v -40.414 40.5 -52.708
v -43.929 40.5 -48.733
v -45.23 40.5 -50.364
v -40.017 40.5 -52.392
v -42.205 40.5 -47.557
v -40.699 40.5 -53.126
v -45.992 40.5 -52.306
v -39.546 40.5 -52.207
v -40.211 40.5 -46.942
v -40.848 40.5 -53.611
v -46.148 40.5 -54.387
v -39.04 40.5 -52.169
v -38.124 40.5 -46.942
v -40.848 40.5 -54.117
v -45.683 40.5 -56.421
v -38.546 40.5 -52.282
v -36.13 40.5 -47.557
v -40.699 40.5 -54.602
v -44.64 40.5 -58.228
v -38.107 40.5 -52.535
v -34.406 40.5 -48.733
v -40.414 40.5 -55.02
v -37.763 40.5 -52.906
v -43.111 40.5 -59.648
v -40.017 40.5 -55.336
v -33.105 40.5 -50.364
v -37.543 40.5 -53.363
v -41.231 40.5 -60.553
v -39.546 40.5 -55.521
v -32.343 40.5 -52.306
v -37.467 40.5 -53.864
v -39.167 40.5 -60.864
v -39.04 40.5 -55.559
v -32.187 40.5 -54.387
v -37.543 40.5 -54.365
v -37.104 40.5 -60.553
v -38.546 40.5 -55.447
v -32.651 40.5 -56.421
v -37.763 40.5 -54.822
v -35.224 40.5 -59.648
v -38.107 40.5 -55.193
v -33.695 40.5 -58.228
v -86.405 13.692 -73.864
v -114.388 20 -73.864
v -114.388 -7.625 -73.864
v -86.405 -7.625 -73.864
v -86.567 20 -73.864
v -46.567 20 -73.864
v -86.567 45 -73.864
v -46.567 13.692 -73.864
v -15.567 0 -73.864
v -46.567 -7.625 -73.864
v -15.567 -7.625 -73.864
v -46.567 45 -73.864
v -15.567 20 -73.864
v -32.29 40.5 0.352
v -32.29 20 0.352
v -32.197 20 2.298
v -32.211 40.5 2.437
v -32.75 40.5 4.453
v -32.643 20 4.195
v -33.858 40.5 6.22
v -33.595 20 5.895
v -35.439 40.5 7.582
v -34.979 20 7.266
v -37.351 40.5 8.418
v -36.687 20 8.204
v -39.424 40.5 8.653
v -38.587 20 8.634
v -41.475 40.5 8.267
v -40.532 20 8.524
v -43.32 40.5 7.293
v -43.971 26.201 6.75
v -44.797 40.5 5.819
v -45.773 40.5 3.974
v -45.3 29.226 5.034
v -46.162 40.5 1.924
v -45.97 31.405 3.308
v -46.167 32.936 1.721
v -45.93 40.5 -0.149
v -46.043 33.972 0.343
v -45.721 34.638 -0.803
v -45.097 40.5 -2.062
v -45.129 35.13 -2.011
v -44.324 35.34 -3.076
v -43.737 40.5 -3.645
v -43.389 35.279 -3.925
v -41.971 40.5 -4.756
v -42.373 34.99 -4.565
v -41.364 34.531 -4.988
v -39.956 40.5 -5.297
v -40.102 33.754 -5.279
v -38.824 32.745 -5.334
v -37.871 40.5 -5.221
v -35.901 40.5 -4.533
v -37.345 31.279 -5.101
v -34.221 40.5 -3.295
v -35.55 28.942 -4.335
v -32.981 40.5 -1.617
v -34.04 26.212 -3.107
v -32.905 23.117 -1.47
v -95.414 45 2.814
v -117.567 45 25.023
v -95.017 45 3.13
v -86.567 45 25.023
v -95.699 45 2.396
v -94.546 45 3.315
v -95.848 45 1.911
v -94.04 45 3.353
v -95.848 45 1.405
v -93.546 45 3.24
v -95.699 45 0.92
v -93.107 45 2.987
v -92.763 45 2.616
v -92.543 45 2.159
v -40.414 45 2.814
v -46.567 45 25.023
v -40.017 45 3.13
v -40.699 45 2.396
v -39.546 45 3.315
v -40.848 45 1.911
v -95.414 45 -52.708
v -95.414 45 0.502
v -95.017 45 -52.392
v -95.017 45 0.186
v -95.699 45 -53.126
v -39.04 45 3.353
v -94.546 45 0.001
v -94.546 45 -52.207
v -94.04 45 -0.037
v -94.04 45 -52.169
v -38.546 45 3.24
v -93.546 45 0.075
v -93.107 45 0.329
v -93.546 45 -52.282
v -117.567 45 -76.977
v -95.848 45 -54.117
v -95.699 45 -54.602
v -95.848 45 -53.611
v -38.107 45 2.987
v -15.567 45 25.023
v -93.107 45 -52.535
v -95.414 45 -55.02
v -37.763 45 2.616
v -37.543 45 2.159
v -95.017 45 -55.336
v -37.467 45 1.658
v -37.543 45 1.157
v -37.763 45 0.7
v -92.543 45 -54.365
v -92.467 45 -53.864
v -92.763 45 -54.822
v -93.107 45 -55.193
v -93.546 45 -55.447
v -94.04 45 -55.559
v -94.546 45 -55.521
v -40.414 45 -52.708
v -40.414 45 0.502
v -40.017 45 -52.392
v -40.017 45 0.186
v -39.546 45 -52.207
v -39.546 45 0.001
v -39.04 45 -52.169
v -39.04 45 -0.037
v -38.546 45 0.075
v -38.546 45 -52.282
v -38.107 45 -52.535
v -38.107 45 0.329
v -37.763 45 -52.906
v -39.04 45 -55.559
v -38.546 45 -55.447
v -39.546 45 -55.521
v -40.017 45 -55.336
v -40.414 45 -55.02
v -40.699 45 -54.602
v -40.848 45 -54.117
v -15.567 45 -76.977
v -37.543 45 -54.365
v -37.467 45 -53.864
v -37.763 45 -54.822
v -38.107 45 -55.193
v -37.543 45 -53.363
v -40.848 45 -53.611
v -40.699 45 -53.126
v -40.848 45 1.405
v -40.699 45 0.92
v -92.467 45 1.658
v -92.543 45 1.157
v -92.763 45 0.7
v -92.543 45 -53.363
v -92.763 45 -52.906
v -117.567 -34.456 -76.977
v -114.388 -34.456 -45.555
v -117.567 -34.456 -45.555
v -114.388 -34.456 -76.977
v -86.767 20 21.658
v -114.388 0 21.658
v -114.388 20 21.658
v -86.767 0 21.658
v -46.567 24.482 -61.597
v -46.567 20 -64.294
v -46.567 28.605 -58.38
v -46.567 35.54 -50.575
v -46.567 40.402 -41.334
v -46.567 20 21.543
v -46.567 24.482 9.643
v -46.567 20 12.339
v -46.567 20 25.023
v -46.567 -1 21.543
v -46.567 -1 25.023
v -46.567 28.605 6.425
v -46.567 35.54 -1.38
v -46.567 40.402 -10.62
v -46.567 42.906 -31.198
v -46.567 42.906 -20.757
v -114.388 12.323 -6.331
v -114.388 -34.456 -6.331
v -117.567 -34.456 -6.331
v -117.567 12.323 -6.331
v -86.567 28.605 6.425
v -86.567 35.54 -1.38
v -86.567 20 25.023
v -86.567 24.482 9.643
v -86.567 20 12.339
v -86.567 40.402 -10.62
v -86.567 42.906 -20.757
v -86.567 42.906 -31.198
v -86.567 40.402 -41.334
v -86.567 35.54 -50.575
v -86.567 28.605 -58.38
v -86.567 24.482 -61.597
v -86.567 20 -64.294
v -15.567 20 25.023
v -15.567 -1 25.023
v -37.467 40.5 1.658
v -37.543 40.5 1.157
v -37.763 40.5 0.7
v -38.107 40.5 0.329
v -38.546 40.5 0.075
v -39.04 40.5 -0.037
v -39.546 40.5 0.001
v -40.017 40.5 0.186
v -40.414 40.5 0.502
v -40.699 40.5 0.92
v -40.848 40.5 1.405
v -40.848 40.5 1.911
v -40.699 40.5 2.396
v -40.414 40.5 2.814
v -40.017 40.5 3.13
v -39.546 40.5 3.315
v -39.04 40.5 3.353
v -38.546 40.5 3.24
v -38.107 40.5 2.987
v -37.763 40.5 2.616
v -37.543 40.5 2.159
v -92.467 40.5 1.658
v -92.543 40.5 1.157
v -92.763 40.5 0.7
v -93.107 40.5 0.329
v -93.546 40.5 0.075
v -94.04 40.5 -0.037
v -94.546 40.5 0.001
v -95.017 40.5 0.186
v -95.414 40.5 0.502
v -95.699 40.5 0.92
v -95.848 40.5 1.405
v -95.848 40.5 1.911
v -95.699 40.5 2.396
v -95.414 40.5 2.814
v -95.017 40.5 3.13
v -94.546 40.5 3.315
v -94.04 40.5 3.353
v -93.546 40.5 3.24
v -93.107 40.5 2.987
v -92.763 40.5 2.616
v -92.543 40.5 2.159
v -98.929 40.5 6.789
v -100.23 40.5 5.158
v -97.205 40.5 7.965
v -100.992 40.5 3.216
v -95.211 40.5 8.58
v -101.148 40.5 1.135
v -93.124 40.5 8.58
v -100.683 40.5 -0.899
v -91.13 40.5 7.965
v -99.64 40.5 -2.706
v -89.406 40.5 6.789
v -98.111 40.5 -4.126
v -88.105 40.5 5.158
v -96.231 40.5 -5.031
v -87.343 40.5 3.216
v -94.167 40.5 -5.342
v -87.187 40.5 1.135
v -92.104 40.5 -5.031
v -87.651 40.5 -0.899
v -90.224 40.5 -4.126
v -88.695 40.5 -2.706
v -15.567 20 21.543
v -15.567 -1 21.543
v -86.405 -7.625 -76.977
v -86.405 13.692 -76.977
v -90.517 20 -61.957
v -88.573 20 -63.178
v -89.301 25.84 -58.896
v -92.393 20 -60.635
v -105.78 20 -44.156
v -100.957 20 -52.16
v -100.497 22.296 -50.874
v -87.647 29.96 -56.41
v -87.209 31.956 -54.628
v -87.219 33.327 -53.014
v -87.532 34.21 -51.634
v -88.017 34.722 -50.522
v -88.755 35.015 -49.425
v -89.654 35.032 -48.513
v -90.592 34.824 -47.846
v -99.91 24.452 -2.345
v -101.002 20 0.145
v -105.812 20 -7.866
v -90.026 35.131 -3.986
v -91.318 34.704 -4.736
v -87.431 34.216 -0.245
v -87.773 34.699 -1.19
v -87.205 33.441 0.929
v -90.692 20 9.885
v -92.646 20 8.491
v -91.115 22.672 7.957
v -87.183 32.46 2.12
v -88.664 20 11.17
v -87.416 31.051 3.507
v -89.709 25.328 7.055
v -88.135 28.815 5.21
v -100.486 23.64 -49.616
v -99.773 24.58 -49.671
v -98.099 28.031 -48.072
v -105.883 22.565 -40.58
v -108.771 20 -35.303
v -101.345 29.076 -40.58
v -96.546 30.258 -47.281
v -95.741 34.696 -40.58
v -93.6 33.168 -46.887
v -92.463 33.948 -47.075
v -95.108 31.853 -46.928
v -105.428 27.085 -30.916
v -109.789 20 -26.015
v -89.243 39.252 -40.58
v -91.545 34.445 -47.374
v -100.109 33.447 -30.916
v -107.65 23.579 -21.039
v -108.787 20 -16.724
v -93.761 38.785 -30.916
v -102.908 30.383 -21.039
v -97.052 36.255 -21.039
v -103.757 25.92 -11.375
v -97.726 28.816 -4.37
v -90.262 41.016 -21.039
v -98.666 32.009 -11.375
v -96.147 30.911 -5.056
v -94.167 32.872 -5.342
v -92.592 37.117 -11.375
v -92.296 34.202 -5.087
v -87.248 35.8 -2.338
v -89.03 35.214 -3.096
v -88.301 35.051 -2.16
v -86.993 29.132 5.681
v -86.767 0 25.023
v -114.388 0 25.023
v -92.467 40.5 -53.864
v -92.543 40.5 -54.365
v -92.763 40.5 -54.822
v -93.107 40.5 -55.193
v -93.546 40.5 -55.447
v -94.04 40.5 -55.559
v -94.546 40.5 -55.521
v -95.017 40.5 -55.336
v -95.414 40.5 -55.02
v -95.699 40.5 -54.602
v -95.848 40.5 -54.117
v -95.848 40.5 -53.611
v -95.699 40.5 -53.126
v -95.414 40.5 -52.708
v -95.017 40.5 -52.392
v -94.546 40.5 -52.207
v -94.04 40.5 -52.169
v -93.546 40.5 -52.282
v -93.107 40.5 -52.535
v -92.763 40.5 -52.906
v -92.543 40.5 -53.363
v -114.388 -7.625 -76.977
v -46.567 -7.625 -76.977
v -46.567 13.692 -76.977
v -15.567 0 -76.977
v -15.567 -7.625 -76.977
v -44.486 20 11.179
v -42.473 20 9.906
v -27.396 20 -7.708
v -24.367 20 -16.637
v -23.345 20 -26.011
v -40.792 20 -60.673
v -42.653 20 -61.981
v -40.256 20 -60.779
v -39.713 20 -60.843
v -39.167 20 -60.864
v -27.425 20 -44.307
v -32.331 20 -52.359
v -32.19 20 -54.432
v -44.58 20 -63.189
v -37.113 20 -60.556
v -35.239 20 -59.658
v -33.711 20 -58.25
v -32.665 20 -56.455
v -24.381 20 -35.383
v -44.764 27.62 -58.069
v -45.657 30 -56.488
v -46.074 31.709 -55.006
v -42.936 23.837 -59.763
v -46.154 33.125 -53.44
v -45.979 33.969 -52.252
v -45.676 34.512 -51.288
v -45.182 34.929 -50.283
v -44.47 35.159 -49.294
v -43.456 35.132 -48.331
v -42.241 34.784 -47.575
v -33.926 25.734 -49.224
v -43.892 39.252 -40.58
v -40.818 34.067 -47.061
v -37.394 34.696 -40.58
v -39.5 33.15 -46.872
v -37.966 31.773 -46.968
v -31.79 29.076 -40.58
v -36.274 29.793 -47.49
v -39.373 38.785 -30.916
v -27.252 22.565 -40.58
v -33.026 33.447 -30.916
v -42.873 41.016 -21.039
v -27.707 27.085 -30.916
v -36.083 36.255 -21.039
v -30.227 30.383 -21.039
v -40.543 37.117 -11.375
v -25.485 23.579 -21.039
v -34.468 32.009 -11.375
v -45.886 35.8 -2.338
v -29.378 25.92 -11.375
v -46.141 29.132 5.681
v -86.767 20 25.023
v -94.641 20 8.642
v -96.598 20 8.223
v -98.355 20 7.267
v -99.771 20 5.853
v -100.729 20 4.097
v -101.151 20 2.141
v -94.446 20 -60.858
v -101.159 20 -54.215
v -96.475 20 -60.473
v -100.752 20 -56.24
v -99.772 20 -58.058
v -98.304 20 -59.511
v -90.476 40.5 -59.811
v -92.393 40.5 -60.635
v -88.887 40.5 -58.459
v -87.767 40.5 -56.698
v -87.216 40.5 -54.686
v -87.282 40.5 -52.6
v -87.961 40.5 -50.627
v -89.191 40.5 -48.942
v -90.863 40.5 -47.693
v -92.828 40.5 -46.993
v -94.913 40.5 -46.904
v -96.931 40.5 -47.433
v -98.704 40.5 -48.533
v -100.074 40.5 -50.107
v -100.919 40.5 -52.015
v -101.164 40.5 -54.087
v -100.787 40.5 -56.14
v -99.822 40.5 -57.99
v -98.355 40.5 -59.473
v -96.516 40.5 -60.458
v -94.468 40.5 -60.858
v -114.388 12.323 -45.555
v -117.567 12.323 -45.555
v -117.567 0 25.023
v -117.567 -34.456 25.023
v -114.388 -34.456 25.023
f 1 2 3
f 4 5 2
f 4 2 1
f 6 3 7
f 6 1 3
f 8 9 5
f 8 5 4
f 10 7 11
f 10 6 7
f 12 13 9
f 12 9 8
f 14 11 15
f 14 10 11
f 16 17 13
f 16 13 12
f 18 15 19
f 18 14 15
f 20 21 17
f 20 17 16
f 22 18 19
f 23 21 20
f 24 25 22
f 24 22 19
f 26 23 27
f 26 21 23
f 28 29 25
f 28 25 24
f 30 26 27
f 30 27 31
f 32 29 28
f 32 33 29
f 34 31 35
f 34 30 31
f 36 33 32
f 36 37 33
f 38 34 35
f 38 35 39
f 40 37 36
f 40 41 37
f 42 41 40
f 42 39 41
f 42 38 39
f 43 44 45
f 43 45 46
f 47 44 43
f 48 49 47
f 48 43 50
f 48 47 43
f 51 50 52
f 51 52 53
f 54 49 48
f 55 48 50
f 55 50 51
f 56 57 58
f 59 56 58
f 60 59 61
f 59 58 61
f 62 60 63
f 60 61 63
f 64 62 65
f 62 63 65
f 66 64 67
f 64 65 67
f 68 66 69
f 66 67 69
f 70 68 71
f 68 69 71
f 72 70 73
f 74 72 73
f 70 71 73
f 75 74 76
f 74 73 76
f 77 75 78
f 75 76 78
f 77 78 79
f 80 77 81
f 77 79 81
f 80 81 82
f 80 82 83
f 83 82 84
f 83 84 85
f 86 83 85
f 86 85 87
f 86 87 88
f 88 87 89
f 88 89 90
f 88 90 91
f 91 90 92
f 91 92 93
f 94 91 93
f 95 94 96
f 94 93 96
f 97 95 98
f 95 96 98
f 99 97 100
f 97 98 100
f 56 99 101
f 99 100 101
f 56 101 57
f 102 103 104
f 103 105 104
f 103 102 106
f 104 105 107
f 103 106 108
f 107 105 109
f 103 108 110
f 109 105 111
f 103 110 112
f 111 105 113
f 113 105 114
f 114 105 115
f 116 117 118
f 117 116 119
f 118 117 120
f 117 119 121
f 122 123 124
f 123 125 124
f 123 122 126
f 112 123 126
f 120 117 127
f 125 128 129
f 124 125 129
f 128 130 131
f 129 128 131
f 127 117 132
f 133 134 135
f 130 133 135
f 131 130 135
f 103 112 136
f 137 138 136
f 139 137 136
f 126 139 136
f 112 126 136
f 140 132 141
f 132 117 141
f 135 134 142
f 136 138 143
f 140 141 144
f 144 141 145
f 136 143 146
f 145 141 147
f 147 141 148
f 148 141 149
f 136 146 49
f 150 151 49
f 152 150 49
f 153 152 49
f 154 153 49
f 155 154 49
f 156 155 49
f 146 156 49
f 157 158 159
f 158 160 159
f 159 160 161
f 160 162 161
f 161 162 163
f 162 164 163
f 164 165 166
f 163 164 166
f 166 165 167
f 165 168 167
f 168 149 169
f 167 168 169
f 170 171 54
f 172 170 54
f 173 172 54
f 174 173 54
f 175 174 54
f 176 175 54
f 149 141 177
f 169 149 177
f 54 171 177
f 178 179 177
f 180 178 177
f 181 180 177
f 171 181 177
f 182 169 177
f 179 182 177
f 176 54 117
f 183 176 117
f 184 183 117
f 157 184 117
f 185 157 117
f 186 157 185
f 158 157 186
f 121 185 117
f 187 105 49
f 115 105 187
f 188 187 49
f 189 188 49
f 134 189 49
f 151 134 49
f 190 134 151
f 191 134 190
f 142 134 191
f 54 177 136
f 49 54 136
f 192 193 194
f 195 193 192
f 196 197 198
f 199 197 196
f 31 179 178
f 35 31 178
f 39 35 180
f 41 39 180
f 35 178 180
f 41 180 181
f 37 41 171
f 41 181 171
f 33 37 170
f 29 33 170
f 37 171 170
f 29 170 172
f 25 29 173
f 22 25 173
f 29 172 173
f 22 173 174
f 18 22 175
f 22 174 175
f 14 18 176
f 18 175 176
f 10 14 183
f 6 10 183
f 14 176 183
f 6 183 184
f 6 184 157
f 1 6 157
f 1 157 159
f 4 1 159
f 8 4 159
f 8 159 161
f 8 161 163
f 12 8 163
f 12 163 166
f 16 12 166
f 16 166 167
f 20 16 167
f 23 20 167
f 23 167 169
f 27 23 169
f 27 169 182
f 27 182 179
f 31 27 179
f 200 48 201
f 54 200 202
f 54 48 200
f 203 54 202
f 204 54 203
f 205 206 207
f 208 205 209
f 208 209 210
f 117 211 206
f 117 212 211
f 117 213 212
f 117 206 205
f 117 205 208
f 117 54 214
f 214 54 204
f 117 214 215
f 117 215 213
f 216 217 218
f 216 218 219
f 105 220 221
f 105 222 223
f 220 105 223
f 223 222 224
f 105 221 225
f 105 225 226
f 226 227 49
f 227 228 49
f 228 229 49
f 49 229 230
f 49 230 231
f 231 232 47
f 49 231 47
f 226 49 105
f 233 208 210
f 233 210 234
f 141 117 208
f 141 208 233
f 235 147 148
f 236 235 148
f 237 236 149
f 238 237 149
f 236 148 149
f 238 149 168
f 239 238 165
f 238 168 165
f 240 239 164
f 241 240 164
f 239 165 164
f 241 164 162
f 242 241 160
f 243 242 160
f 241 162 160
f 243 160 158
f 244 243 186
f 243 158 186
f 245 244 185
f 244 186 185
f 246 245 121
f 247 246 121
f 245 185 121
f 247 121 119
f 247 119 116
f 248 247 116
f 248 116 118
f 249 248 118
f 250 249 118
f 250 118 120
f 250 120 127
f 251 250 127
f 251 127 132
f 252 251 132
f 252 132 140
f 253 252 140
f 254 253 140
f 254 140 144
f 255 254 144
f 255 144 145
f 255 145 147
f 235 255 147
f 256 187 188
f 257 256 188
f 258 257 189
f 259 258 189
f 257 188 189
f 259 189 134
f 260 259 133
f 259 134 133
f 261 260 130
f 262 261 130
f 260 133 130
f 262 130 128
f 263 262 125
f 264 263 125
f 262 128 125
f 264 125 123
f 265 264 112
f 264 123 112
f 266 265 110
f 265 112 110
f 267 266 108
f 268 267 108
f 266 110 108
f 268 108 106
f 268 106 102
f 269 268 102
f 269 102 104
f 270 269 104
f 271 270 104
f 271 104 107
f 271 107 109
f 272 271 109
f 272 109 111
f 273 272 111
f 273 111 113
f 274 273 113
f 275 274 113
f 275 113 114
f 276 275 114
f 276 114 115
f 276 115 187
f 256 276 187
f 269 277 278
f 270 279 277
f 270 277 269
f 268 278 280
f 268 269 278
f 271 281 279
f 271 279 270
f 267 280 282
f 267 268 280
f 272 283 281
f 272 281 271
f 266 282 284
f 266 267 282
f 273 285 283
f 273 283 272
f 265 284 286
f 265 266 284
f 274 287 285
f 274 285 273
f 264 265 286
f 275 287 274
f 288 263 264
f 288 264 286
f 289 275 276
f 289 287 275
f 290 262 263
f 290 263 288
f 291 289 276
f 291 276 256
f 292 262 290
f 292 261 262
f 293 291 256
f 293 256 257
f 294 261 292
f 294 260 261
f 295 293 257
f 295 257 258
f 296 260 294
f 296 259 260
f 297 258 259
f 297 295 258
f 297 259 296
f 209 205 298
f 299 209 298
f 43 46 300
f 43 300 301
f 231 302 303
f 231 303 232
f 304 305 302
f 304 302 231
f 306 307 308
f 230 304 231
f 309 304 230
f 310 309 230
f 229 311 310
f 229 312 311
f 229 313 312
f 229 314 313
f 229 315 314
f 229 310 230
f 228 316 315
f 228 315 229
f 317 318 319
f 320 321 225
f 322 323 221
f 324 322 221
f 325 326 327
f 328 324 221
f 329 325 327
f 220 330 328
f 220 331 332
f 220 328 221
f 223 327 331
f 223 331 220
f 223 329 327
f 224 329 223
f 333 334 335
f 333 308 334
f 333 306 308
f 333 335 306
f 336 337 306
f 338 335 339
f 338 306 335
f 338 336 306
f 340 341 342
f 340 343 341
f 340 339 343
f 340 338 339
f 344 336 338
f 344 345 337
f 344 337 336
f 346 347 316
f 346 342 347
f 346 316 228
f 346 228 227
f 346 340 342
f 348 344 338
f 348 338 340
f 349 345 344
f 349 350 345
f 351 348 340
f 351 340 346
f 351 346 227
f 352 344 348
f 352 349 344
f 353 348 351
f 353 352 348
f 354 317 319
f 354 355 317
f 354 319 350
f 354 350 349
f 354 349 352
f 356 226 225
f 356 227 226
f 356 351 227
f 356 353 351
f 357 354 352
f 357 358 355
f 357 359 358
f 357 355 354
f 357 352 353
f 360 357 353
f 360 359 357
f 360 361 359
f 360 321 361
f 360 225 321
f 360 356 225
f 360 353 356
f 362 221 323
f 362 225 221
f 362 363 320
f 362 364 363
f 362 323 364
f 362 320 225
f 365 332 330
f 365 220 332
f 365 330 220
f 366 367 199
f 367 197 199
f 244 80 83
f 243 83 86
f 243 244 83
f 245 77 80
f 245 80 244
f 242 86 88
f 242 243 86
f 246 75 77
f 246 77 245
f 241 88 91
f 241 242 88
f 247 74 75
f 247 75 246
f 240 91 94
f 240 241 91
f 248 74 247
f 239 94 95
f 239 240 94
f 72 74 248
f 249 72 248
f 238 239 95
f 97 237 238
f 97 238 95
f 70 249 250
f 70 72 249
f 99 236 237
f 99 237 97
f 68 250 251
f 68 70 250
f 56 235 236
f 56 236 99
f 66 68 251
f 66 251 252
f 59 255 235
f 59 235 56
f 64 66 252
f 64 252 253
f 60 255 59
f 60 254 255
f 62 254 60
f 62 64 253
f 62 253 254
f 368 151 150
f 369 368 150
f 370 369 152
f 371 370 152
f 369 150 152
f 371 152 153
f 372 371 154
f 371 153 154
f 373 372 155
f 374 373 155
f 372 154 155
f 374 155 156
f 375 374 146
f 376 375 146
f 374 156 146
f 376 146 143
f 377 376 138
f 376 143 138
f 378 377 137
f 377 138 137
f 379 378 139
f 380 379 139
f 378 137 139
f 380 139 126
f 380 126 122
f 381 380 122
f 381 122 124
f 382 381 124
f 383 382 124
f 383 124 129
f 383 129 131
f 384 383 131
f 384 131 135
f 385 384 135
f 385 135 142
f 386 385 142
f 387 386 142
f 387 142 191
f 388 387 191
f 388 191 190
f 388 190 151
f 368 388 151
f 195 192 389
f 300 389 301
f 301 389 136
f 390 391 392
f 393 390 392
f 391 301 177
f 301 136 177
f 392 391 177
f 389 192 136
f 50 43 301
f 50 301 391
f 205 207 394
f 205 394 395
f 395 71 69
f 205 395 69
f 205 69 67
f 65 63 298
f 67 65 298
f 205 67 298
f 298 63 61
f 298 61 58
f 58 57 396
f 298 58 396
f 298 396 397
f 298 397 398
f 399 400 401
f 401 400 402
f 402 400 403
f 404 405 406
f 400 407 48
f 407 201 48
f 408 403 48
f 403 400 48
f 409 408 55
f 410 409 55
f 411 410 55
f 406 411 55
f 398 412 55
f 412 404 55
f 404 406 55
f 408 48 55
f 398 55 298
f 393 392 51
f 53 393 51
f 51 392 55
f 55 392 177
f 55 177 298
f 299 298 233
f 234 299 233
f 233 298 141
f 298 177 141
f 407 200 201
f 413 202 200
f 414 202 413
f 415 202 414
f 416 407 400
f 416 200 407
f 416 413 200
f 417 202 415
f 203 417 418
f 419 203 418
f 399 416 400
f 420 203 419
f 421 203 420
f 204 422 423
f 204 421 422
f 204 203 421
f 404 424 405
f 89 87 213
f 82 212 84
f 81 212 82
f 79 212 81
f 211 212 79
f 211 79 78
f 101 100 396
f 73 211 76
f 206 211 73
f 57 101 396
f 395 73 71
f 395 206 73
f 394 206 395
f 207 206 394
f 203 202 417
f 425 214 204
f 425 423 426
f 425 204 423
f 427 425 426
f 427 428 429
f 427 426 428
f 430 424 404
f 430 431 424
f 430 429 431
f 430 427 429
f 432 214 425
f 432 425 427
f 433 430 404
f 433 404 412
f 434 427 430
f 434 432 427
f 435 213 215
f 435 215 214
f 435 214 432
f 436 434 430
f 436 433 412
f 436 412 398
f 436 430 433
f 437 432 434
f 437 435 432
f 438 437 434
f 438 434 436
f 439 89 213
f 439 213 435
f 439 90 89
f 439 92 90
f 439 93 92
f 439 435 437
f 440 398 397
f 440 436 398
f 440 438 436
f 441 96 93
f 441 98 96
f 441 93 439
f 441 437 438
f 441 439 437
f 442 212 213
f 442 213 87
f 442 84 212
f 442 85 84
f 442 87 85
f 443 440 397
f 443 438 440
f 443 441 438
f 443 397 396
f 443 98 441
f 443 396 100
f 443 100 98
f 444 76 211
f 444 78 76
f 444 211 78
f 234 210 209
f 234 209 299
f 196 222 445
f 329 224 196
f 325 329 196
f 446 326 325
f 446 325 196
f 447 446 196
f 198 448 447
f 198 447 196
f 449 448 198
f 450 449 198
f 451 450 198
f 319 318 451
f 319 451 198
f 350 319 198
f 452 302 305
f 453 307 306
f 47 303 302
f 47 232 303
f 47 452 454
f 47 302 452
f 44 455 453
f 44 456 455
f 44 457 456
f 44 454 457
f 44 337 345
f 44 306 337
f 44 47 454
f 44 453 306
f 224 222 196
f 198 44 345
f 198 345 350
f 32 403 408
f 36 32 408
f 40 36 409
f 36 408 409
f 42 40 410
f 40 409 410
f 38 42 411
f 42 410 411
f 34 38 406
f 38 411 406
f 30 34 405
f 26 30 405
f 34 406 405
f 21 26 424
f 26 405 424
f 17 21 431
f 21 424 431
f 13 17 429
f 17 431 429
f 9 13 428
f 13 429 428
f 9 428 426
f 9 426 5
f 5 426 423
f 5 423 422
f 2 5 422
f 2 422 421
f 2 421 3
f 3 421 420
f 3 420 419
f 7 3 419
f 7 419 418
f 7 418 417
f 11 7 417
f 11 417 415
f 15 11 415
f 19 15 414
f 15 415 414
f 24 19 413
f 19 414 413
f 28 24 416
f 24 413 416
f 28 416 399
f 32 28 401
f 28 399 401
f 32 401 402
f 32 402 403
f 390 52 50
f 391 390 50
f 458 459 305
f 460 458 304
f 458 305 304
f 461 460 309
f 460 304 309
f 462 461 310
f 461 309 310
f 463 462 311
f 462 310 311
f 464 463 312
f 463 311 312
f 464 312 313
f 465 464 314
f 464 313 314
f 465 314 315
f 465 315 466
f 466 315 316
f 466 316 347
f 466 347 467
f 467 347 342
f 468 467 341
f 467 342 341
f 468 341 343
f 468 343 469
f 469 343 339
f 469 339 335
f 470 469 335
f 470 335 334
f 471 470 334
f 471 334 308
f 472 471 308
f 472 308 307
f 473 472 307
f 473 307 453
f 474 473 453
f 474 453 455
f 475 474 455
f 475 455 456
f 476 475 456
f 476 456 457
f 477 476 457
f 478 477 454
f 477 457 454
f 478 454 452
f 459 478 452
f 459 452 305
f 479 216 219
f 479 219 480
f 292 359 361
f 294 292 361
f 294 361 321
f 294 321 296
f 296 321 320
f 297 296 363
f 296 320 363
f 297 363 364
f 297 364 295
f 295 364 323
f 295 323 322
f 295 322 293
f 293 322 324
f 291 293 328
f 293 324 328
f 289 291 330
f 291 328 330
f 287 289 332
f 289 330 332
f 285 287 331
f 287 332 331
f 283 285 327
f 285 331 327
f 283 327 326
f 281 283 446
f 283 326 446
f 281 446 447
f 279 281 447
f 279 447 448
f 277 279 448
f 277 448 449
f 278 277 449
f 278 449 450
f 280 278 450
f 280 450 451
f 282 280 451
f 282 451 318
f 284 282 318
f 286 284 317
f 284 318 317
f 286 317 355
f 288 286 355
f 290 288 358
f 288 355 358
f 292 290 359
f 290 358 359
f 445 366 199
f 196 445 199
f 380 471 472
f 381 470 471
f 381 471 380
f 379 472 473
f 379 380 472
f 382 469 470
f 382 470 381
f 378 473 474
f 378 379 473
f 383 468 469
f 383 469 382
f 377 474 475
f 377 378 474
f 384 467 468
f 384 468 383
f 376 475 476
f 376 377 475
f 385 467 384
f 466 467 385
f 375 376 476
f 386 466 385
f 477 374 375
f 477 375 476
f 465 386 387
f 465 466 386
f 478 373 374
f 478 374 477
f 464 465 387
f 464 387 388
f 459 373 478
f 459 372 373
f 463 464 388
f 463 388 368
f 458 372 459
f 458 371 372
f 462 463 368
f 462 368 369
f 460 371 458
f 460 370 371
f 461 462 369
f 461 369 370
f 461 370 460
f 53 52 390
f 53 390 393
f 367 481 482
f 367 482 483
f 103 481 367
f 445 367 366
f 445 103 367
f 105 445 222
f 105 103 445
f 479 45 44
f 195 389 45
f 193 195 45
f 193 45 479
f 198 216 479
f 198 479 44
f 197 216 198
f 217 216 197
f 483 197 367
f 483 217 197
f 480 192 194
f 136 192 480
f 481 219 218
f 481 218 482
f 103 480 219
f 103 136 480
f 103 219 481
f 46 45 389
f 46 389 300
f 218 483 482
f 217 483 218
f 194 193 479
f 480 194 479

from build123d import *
from build123d.topology import SkipClean

# Parameters (mm, degrees)
SKETCH1_W                   = 102
SKETCH1_H                   = 102
BOSS_EXTRUDE1_DEPTH         = 50
CUT_EXTRUDE_THIN1_OUTLINE_W = 40
CUT_EXTRUDE_THIN1_OUTLINE_H = 95.773670058
CUT_EXTRUDE_THIN1_DEPTH     = 50
SKETCH4_W                   = 40
SKETCH4_H                   = 6.202657501
CUT_EXTRUDE3_DEPTH          = 54
SKETCH5_W                   = 33.817621941
SKETCH5_H                   = 102.594578927
CUT_EXTRUDE4_DEPTH          = 20
SKETCH6_W                   = 27.820383201
SKETCH6_H                   = 98.886835029
CUT_EXTRUDE5_DEPTH          = 20
SKETCH7_W                   = 30.8
SKETCH7_H                   = 3.364819678
BOSS_EXTRUDE2_DEPTH         = 21
SKETCH9_W                   = 31
SKETCH9_H                   = 3.479961613
BOSS_EXTRUDE4_DEPTH         = 21
SKETCH11_W                  = 98.820383201
SKETCH11_H                  = 3.113164971
BOSS_EXTRUDE6_DEPTH         = 47.625
SKETCH14_W                  = 102
SKETCH14_H                  = 5
CUT_EXTRUDE7_DEPTH          = 105
SKETCH17_R                  = 7
CUT_EXTRUDE12_DEPTH         = 20.5
M3_CLEARANCE_HOLE1_D        = 3.4
SKETCH22_W                  = 3.179616799
SKETCH22_H                  = 102
BOSS_EXTRUDE7_DEPTH         = 47.6
SKETCH23_W                  = 98.820383201
SKETCH23_H                  = 3.113164971
CUT_EXTRUDE13_DEPTH         = 40
SKETCH24_W                  = 102
SKETCH24_H                  = 13.144479163
CUT_EXTRUDE14_DEPTH         = 10
SKETCH25_W                  = 39.837829701
SKETCH25_H                  = 21.316982849
CUT_EXTRUDE15_DEPTH         = 6
SKETCH26_W                  = 39.22350869
SKETCH26_H                  = 46.778434415
CUT_EXTRUDE16_DEPTH         = 6


# Read off the part's stored shape, not the designer's step: Cut-Extrude-Thin1
with BuildPart() as part:
    # Sketch1 → Boss-Extrude1 (new body)
    with BuildSketch(Plane(origin=(0, 0, 0), x_dir=(1, 0, 0), z_dir=(0, 1, 0))):
        with Locations((-66.567363259, 25.977216604)):
            Rectangle(SKETCH1_W, SKETCH1_H)
    extrude(amount=BOSS_EXTRUDE1_DEPTH)

    # Sketch2 → Cut-Revolve1 (revolve, cut)
    with SkipClean():  # the faces are left unmerged after this step: merging them gives an invalid solid
        with BuildSketch(Plane(origin=(0, 0, 0), x_dir=(1, 0, 0), z_dir=(0, 1, 0))):
            with BuildLine():
                ThreePointArc((-66.567363259, 73.602216604), (-114.192363259, 25.977216604), (-66.567363259, -21.647783396))
                Line((-66.567363259, -21.647783396), (-66.567363259, 73.602216604))
            make_face()
            with BuildLine():
                Line((-66.567363259, 73.602216604), (-66.567363259, -21.647783396))
                ThreePointArc((-66.567363259, -21.647783396), (-32.891402805, -7.69874385), (-18.942363259, 25.977216604))
                ThreePointArc((-18.942363259, 25.977216604), (-32.891402805, 59.653177058), (-66.567363259, 73.602216604))
            make_face()
        revolve(axis=Axis((-66.567363259, 0, 21.647783396), (0, 0, -1)), mode=Mode.SUBTRACT)
    add(part.part.scale(1), mode=Mode.REPLACE)  # the faces are merged on a copy

    # Cut-Extrude-Thin1 outline → Cut-Extrude-Thin1 (cut)
    with BuildSketch(Plane(origin=(0, 0, 0), x_dir=(1, 0, 0), z_dir=(0, 1, 0))):
        with Locations((-66.567363259, 25.977216604)):
            Rectangle(CUT_EXTRUDE_THIN1_OUTLINE_W, CUT_EXTRUDE_THIN1_OUTLINE_H)
    extrude(amount=CUT_EXTRUDE_THIN1_DEPTH, mode=Mode.SUBTRACT)

    # Sketch4 → Cut-Extrude3 (cut)
    with BuildSketch(Plane(origin=(0, 0, 0), x_dir=(1, 0, 0), z_dir=(0, 1, 0))):
        with Locations((-66.567363259, -25.010947176)):
            Rectangle(SKETCH4_W, SKETCH4_H)
    extrude(amount=CUT_EXTRUDE3_DEPTH, mode=Mode.SUBTRACT)

    # Sketch5 → Cut-Extrude4 (cut)
    with BuildSketch(Plane(origin=(0, 0, 0), x_dir=(1, 0, 0), z_dir=(0, 1, 0))):
        with Locations((-29.658552289, 22.56676217)):
            Rectangle(SKETCH5_W, SKETCH5_H)
    extrude(amount=CUT_EXTRUDE4_DEPTH, mode=Mode.SUBTRACT)

    # Sketch6 → Cut-Extrude5 (cut)
    with BuildSketch(Plane(origin=(0, 0, 0), x_dir=(-1, 0, 0), z_dir=(0, -1, 0))):
        with Locations((100.47755486, 24.420634119)):
            Rectangle(SKETCH6_W, SKETCH6_H)
    extrude(amount=-CUT_EXTRUDE5_DEPTH, mode=Mode.SUBTRACT)

    # Sketch7 → Boss-Extrude2 (add)
    with BuildSketch(Plane(origin=(0, 0, 0), x_dir=(1, 0, 0), z_dir=(0, 1, 0))):
        with Locations((-102.167363259, -23.340373557)):
            Rectangle(SKETCH7_W, SKETCH7_H)
    extrude(amount=BOSS_EXTRUDE2_DEPTH)

    # Sketch9 → Boss-Extrude4 (add)
    with BuildSketch(Plane.XZ.offset(-20)):
        with Locations((-31.067363259, 23.28280259)):
            Rectangle(SKETCH9_W, SKETCH9_H)
    extrude(amount=BOSS_EXTRUDE4_DEPTH)

    # Sketch11 → Boss-Extrude6 (add)
    with BuildSketch(Plane.XZ):
        with Locations((-64.97755486, -75.420634119)):
            Rectangle(SKETCH11_W, SKETCH11_H)
    extrude(amount=BOSS_EXTRUDE6_DEPTH)

    # Sketch14 → Cut-Extrude7 (cut)
    with BuildSketch(Plane(origin=(-15.567363259, 0, 0), x_dir=(0, 0, -1), z_dir=(1, 0, 0))):
        with Locations((25.977216604, 47.5)):
            Rectangle(SKETCH14_W, SKETCH14_H)
    extrude(amount=-CUT_EXTRUDE7_DEPTH, mode=Mode.SUBTRACT)

    # Sketch17 → Cut-Extrude12 (cut)
    with BuildSketch(Plane.XZ.offset(-20)):
        with Locations(Location((-94.167363259, 1.657963718, 0), (0, 0, 270))):
            Circle(SKETCH17_R)
        with Locations(Location((-94.167363259, -53.864051633, 0), (0, 0, 284.685382437))):
            Circle(SKETCH17_R)
        with Locations(Location((-39.167363259, 1.657963718, 0), (0, 0, 349.246729183))):
            Circle(SKETCH17_R)
        with Locations(Location((-39.167363259, -53.864051633, 0), (0, 0, 270))):
            Circle(SKETCH17_R)
    extrude(amount=-CUT_EXTRUDE12_DEPTH, mode=Mode.SUBTRACT)

    # M3 Clearance Hole1 (through all)
    with Locations(Plane(origin=(0, 40.5, 0), x_dir=(-1, 0, 0), z_dir=(0, -1, 0))):
        with Locations((94.167363259, -1.657963718), (39.167363259, -1.657963718), (39.167363259, 53.864051633), (94.167363259, 53.864051633)):
            Hole(M3_CLEARANCE_HOLE1_D / 2)

    # Sketch22 → Boss-Extrude7 (add)
    with BuildSketch(Plane.XZ):
        with Locations((-115.97755486, -25.977216604)):
            Rectangle(SKETCH22_W, SKETCH22_H)
    extrude(amount=BOSS_EXTRUDE7_DEPTH)

    # Sketch23 → Cut-Extrude13 (cut)
    with BuildSketch(Plane.XZ.offset(47.625)):
        with Locations((-64.97755486, -75.420634119)):
            Rectangle(SKETCH23_W, SKETCH23_H)
    extrude(amount=-CUT_EXTRUDE13_DEPTH, mode=Mode.SUBTRACT)

    # Sketch24 → Cut-Extrude14 (cut)
    with BuildSketch(Plane(origin=(-114.38774646, 0, 0), x_dir=(0, 0, -1), z_dir=(1, 0, 0))):
        with Locations((25.977216604, -41.027760419)):
            Rectangle(SKETCH24_W, SKETCH24_H)
    extrude(amount=-CUT_EXTRUDE14_DEPTH, mode=Mode.SUBTRACT)

    # Sketch25 → Cut-Extrude15 (cut)
    with BuildSketch(Plane.XY.offset(-73.864051633)):
        with Locations((-66.48627811, 3.033491424)):
            Rectangle(SKETCH25_W, SKETCH25_H)
    extrude(amount=-CUT_EXTRUDE15_DEPTH, mode=Mode.SUBTRACT)

    # Sketch26 → Cut-Extrude16 (cut)
    with BuildSketch(Plane(origin=(-114.38774646, 0, 0), x_dir=(0, 0, -1), z_dir=(1, 0, 0))):
        with Locations((25.942998987, -11.06630363)):
            Rectangle(SKETCH26_W, SKETCH26_H)
    extrude(amount=-CUT_EXTRUDE16_DEPTH, mode=Mode.SUBTRACT)


solid = part.part
